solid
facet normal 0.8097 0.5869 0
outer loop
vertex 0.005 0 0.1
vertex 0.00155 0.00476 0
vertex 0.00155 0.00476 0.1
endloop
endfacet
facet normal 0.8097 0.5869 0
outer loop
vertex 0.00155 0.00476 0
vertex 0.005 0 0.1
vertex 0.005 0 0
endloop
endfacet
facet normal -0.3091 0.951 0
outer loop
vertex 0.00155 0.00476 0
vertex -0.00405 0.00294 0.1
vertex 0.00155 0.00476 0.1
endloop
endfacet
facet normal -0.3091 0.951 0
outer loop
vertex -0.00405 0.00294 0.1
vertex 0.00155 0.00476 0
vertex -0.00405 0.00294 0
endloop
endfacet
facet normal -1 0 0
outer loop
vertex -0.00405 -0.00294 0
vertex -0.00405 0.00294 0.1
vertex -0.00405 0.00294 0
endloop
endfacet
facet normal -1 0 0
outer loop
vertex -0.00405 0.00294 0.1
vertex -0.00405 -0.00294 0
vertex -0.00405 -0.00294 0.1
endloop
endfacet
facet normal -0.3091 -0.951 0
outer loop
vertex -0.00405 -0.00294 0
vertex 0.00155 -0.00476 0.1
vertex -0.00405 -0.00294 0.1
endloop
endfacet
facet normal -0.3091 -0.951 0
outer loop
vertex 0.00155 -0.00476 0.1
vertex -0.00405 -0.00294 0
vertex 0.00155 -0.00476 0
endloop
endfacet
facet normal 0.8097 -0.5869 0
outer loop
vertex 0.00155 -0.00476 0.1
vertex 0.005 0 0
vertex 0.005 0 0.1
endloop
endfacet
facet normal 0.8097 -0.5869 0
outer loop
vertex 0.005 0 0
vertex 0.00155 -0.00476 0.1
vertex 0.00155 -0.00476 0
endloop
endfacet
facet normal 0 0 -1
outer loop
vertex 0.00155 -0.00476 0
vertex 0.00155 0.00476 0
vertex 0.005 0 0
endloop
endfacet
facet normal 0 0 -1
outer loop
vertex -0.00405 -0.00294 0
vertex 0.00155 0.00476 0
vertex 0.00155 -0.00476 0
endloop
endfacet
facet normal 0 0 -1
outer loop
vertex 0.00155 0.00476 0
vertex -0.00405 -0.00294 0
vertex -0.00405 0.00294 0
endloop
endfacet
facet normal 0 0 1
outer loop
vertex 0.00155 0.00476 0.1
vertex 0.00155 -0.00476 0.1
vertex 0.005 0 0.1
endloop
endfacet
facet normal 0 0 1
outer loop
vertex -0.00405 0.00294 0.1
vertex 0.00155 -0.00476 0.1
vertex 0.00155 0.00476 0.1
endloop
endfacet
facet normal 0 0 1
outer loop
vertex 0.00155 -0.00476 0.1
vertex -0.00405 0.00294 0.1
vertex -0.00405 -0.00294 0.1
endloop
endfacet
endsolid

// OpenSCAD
module rung(thickness=0.01, width=0.1, depth=0.1) {

cylinder(h=depth, d=thickness);
}
rung();
